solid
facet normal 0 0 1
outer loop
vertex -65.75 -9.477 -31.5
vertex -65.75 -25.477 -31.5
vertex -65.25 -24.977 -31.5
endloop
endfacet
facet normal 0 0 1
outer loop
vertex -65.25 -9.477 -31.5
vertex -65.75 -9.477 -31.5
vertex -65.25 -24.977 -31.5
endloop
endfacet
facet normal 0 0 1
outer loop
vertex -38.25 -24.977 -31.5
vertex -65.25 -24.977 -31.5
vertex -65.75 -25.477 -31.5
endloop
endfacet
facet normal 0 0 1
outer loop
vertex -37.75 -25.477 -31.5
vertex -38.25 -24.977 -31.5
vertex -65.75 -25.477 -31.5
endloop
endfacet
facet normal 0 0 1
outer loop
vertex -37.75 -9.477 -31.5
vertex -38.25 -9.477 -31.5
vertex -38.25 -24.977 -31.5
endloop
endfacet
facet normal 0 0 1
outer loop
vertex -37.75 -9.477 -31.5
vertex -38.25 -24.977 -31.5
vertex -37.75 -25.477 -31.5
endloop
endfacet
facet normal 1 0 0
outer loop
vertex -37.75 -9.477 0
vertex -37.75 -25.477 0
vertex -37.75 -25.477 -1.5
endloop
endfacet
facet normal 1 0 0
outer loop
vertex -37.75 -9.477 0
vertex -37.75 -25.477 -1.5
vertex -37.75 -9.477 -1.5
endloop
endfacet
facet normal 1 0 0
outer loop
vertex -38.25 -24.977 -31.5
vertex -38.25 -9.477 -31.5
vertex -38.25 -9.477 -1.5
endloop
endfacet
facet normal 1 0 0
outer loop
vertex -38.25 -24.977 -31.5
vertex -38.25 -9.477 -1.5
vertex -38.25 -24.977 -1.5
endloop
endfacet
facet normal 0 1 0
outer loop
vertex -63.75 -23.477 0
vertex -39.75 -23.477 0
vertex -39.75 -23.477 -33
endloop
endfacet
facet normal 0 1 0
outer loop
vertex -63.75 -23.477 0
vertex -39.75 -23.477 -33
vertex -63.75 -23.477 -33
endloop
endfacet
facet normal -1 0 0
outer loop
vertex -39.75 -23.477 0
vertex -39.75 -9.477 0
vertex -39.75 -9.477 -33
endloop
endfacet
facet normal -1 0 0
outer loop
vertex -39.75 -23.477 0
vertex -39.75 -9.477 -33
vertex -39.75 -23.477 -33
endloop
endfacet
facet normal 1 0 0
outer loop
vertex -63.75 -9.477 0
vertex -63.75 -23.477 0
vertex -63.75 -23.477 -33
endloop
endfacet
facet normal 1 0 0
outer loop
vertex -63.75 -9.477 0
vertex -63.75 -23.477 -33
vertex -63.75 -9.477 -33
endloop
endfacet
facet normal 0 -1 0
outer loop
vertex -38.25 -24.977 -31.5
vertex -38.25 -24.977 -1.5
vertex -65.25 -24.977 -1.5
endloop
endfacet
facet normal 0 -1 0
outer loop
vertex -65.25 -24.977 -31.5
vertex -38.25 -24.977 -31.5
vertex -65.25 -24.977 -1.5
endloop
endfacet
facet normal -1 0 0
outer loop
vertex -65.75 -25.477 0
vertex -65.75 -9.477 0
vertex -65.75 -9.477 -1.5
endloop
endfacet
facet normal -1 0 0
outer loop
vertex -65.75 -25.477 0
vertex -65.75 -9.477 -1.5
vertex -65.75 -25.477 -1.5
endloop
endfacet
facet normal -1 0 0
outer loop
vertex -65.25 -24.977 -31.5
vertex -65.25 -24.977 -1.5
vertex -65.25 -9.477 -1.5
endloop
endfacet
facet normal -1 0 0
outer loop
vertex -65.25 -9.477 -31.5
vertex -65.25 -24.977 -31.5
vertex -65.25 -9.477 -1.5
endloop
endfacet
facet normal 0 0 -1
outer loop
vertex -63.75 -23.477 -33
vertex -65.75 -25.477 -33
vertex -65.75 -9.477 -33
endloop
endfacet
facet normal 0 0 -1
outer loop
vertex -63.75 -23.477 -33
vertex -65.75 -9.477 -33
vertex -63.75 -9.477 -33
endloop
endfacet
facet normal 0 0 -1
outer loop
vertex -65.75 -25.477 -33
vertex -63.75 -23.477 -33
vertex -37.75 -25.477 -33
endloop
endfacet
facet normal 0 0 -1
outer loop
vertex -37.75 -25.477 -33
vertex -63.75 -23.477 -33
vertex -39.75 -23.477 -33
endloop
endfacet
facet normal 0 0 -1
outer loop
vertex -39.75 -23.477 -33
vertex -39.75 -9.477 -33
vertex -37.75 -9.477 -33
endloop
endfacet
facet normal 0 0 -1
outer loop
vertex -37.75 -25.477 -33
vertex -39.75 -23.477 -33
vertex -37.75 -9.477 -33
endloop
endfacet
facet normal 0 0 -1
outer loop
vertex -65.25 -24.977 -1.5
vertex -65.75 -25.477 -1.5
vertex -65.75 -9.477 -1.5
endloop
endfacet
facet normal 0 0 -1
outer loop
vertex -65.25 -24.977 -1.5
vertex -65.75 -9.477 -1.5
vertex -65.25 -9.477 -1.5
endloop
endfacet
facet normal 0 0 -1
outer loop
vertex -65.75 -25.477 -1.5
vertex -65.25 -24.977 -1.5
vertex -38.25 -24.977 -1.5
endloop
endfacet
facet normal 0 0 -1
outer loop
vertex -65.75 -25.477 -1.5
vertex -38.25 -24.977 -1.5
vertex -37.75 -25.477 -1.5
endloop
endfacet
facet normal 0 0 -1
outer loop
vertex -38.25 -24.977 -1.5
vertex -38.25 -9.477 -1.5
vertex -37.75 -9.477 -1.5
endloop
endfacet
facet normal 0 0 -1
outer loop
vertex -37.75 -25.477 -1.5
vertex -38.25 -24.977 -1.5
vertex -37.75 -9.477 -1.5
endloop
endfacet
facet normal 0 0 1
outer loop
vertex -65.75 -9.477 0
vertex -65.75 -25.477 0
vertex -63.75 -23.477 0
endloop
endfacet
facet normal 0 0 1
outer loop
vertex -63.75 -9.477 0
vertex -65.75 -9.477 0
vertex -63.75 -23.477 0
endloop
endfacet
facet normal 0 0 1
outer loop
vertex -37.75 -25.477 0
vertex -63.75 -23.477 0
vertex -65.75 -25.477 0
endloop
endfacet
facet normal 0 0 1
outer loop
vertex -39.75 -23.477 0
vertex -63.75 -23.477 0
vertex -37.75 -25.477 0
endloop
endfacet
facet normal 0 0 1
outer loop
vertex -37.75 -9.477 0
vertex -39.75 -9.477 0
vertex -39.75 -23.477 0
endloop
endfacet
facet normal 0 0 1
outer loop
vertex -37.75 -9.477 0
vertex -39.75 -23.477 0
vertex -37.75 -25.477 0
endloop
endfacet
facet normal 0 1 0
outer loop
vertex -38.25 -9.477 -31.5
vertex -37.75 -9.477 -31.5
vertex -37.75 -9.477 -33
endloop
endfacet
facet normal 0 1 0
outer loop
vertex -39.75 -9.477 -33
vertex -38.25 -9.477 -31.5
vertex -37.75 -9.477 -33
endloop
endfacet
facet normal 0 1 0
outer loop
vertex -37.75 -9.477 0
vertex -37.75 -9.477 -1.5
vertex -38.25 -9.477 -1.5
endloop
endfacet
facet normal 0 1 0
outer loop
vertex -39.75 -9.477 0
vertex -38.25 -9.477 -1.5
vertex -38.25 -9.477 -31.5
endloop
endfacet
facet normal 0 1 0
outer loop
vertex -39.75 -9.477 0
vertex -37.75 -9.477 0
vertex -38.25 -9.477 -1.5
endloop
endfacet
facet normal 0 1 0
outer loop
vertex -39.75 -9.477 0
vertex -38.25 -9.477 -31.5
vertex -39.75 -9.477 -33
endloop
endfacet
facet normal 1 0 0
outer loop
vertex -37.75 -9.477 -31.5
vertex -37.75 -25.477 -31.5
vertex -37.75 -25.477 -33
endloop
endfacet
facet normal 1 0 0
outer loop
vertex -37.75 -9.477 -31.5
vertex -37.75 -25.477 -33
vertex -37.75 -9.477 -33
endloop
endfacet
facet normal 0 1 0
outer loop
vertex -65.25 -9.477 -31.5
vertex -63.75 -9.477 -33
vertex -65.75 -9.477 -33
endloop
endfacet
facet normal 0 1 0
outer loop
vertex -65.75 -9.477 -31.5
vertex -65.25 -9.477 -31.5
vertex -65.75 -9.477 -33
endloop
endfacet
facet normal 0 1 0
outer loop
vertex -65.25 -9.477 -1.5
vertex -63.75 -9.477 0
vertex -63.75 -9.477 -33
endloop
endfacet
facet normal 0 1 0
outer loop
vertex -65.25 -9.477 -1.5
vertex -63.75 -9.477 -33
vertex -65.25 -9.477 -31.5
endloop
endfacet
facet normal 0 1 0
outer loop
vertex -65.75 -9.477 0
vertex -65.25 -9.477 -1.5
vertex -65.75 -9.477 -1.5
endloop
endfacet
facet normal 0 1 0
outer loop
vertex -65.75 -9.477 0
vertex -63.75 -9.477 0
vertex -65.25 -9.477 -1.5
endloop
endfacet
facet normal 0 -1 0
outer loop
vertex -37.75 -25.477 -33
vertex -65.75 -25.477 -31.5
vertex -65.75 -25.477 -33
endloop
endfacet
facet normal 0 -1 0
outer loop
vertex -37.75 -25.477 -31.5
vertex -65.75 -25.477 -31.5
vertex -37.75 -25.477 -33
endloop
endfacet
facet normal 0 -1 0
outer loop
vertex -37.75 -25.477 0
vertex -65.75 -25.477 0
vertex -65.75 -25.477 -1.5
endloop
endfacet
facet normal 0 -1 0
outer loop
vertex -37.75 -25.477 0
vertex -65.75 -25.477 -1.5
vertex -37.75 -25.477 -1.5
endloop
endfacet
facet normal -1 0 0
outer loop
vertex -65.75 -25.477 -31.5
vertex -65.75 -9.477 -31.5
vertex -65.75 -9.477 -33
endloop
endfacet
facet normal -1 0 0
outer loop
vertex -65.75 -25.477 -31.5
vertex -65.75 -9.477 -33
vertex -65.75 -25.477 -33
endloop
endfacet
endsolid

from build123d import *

# Parameters (mm, degrees)
BOSS_EXTRUDE1_DEPTH = 33
CUT_EXTRUDE1_START  = -1.5
CUT_EXTRUDE1_DEPTH  = 30


with BuildPart() as part:
    # Sketch1 → Boss-Extrude1 (new body)
    with BuildSketch(Plane.XY):
        Polygon((-37.75, -25.477481475), (-37.75, -9.477481475), (-39.75, -9.477481475), (-39.75, -23.477481475), (-63.75, -23.477481475), (-63.75, -9.477481475), (-65.75, -9.477481475), (-65.75, -25.477481475), align=None)
    extrude(amount=-BOSS_EXTRUDE1_DEPTH)

    # Sketch4 → Cut-Extrude1 (cut)
    with BuildSketch(Plane.XY.offset(CUT_EXTRUDE1_START)):
        Polygon((-65.25, -24.977481475), (-65.25, -9.477481475), (-65.75, -9.477481475), (-65.75, -25.477481475), (-37.75, -25.477481475), (-37.75, -9.477481475), (-38.25, -9.477481475), (-38.25, -24.977481475), align=None)
    extrude(amount=-CUT_EXTRUDE1_DEPTH, mode=Mode.SUBTRACT)


solid = part.part
